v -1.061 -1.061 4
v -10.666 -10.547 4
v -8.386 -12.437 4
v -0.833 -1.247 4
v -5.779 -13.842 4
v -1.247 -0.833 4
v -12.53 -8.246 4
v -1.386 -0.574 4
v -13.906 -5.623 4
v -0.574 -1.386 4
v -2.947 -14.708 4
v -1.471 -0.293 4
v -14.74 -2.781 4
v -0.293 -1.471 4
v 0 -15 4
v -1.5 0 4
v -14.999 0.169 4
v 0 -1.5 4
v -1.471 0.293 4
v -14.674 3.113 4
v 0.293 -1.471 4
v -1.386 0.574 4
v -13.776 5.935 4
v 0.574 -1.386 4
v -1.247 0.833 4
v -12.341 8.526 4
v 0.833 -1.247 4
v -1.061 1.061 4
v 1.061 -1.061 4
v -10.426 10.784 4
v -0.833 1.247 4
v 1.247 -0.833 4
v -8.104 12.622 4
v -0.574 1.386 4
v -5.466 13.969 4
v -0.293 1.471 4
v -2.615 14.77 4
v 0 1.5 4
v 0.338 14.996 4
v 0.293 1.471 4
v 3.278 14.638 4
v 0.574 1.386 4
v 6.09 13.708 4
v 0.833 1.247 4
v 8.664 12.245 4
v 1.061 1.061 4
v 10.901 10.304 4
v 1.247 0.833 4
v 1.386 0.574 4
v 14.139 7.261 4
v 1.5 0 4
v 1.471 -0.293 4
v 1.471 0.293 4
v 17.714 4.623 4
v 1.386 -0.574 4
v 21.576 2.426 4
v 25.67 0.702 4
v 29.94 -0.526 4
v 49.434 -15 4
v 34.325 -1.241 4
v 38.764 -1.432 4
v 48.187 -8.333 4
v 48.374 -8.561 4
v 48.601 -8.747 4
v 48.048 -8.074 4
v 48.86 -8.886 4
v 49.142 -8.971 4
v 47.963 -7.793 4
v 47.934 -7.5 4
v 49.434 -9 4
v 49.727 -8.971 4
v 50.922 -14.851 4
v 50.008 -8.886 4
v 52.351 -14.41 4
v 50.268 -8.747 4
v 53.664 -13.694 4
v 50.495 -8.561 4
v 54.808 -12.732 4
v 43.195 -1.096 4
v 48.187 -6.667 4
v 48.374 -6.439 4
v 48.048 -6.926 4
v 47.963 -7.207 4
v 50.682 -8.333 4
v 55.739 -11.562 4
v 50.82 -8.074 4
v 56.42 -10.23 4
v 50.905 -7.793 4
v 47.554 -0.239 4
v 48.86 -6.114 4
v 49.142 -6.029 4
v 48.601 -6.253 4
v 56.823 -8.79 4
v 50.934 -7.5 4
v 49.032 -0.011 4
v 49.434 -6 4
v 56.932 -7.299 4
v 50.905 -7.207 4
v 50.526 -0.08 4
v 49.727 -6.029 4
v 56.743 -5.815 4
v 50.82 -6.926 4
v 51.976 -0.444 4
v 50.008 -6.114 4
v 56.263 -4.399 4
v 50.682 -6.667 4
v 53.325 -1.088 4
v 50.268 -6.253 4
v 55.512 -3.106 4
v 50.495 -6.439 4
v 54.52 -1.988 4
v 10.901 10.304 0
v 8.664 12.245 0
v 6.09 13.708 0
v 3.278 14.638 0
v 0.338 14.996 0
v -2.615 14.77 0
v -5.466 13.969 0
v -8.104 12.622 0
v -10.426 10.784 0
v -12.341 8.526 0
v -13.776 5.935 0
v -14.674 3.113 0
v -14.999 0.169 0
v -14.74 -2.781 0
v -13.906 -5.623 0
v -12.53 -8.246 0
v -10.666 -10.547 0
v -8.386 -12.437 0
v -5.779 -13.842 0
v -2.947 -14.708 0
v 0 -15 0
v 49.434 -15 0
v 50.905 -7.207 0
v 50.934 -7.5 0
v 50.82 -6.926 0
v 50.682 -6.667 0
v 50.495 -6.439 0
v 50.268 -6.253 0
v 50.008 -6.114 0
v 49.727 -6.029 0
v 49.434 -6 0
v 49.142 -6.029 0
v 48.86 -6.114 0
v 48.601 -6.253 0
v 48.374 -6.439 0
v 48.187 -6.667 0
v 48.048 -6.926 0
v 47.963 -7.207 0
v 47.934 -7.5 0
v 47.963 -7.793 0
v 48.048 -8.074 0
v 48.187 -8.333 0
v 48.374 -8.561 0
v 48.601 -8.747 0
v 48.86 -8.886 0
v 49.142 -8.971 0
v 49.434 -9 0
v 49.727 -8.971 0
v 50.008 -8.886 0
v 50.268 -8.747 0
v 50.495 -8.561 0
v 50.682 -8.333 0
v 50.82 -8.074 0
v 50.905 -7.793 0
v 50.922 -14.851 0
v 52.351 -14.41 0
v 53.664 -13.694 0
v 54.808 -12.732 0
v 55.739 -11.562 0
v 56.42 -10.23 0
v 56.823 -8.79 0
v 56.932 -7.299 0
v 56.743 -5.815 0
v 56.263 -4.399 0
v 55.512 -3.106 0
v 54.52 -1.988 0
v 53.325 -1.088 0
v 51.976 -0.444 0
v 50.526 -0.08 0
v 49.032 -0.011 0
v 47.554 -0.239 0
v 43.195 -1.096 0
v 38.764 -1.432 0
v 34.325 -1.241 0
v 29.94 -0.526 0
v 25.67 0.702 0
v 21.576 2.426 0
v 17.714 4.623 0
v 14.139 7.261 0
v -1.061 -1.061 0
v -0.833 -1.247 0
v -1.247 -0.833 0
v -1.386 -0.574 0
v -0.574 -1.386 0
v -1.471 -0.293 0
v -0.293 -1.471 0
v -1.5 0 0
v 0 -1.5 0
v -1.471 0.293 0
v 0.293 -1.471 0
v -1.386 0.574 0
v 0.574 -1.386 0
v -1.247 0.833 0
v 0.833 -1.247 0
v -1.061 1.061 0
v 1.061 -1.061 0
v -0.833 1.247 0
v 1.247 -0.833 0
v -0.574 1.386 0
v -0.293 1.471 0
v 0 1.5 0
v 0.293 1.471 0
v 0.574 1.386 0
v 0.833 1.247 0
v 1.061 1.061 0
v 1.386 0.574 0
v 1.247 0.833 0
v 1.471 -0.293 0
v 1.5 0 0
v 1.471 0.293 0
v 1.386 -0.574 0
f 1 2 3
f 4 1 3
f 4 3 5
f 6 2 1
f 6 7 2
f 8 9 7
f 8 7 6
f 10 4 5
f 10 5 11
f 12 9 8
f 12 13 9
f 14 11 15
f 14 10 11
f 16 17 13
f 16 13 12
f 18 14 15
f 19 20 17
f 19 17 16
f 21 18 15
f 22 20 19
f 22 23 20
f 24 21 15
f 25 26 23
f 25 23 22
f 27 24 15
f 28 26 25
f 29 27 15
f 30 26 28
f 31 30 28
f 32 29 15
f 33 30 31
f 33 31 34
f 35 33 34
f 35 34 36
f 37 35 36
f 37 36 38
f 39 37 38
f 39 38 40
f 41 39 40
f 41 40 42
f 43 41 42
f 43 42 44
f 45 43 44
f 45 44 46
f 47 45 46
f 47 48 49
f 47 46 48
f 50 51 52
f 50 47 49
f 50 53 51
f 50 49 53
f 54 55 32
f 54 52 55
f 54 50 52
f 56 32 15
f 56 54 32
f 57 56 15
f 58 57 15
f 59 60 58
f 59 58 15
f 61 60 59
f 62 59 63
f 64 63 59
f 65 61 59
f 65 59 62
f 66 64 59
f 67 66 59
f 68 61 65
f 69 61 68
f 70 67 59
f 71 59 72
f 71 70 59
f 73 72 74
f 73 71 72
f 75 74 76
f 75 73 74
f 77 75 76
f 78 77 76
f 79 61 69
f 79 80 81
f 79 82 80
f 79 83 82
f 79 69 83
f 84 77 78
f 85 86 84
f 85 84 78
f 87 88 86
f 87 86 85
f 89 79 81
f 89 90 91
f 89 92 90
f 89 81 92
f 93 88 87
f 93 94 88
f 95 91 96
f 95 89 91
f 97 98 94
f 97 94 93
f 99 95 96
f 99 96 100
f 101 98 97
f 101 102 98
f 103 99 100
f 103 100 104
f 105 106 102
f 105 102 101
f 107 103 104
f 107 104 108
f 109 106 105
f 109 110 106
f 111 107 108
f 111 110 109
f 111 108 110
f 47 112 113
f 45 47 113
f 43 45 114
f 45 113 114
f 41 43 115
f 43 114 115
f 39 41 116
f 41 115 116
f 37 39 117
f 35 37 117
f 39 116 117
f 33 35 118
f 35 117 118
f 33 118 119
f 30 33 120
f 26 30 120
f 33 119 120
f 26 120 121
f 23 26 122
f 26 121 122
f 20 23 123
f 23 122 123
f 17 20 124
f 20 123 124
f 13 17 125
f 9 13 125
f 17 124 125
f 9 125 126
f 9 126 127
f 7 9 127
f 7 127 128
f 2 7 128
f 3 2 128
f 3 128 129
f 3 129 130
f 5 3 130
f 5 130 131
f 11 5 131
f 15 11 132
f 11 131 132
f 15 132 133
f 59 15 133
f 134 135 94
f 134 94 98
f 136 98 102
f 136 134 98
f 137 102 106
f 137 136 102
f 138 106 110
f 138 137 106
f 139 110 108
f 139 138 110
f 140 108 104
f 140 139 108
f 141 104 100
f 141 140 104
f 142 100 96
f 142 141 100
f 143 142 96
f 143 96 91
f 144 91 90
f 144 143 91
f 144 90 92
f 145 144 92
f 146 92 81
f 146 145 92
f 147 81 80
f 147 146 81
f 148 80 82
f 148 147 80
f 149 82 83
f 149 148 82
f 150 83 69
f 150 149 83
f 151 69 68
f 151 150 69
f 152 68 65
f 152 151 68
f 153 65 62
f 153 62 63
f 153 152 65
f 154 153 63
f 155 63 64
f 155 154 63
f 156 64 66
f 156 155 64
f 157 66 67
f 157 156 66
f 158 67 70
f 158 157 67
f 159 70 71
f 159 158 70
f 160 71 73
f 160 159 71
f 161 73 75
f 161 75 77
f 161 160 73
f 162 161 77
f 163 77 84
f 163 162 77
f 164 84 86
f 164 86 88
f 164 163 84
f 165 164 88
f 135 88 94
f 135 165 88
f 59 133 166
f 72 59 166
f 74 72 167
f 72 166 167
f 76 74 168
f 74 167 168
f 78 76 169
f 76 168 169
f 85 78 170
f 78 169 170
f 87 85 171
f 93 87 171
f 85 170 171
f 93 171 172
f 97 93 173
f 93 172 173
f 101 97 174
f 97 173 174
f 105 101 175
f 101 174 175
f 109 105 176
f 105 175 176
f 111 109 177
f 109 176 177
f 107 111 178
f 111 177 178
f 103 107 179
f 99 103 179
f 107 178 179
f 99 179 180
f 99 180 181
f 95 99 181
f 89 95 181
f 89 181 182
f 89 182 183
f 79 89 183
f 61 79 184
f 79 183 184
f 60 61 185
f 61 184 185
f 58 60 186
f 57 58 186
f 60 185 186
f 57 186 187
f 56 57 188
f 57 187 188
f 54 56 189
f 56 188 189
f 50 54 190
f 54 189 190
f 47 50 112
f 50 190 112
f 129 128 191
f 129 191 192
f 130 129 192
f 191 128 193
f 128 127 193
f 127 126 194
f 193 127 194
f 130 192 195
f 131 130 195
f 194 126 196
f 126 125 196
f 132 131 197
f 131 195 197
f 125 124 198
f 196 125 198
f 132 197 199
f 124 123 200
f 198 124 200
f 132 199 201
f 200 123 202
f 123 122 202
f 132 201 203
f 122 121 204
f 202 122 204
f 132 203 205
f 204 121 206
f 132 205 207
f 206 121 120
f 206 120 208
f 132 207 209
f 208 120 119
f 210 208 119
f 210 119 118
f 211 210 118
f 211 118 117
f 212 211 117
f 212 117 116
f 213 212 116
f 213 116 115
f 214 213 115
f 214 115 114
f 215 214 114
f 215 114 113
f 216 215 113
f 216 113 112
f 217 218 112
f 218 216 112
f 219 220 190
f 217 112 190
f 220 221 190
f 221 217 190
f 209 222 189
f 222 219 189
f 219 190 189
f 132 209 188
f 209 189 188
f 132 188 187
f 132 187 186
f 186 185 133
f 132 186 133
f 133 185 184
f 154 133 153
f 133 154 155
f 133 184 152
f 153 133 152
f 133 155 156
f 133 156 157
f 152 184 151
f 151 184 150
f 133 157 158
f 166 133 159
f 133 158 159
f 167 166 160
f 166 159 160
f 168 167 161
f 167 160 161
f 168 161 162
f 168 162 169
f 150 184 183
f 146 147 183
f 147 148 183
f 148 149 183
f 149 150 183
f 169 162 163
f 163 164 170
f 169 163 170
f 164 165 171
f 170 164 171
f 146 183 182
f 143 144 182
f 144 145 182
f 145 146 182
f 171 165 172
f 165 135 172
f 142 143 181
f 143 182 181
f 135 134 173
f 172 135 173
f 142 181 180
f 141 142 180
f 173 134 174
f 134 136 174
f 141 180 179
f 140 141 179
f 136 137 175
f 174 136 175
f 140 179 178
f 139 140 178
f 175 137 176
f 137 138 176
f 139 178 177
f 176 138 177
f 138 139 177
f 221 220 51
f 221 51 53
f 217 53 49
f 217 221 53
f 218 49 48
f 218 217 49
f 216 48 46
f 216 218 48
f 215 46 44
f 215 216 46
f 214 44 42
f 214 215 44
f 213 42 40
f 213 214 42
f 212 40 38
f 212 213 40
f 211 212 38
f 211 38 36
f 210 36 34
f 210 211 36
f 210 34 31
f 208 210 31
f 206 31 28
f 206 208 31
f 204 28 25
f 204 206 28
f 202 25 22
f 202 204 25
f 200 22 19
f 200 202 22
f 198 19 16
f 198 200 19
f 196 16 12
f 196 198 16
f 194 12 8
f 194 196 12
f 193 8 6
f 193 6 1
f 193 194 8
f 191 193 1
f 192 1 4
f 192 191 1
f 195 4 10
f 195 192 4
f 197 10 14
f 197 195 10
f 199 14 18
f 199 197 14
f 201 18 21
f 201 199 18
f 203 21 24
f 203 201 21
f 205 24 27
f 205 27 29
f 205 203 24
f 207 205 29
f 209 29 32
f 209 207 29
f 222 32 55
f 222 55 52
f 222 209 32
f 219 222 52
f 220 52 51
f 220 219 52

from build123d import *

# Parameters (mm, degrees)
SCHIZZO1_R                   = 1.5
ESTRUSIONE_ESTRUSIONE1_DEPTH = 4


with BuildPart() as part:
    # Schizzo1 → Estrusione-Estrusione1 (new body)
    with BuildSketch(Plane.XY):
        with BuildLine():
            Line((0, -15), (49.434299833, -15))
            ThreePointArc((49.434299833, -15), (56.874189574, -6.552349937), (47.554189972, -0.239477504))
            ThreePointArc((47.554189972, -0.239477504), (27.787162994, 0.02445935), (10.90104019, 10.30375285))
            ThreePointArc((10.90104019, 10.30375285), (-13.775998925, 5.934800218), (0, -15))
        make_face()
        Circle(SCHIZZO1_R, mode=Mode.SUBTRACT)
        with Locations((49.434299833, -7.5)):
            Circle(SCHIZZO1_R, mode=Mode.SUBTRACT)
    extrude(amount=ESTRUSIONE_ESTRUSIONE1_DEPTH)


solid = part.part
